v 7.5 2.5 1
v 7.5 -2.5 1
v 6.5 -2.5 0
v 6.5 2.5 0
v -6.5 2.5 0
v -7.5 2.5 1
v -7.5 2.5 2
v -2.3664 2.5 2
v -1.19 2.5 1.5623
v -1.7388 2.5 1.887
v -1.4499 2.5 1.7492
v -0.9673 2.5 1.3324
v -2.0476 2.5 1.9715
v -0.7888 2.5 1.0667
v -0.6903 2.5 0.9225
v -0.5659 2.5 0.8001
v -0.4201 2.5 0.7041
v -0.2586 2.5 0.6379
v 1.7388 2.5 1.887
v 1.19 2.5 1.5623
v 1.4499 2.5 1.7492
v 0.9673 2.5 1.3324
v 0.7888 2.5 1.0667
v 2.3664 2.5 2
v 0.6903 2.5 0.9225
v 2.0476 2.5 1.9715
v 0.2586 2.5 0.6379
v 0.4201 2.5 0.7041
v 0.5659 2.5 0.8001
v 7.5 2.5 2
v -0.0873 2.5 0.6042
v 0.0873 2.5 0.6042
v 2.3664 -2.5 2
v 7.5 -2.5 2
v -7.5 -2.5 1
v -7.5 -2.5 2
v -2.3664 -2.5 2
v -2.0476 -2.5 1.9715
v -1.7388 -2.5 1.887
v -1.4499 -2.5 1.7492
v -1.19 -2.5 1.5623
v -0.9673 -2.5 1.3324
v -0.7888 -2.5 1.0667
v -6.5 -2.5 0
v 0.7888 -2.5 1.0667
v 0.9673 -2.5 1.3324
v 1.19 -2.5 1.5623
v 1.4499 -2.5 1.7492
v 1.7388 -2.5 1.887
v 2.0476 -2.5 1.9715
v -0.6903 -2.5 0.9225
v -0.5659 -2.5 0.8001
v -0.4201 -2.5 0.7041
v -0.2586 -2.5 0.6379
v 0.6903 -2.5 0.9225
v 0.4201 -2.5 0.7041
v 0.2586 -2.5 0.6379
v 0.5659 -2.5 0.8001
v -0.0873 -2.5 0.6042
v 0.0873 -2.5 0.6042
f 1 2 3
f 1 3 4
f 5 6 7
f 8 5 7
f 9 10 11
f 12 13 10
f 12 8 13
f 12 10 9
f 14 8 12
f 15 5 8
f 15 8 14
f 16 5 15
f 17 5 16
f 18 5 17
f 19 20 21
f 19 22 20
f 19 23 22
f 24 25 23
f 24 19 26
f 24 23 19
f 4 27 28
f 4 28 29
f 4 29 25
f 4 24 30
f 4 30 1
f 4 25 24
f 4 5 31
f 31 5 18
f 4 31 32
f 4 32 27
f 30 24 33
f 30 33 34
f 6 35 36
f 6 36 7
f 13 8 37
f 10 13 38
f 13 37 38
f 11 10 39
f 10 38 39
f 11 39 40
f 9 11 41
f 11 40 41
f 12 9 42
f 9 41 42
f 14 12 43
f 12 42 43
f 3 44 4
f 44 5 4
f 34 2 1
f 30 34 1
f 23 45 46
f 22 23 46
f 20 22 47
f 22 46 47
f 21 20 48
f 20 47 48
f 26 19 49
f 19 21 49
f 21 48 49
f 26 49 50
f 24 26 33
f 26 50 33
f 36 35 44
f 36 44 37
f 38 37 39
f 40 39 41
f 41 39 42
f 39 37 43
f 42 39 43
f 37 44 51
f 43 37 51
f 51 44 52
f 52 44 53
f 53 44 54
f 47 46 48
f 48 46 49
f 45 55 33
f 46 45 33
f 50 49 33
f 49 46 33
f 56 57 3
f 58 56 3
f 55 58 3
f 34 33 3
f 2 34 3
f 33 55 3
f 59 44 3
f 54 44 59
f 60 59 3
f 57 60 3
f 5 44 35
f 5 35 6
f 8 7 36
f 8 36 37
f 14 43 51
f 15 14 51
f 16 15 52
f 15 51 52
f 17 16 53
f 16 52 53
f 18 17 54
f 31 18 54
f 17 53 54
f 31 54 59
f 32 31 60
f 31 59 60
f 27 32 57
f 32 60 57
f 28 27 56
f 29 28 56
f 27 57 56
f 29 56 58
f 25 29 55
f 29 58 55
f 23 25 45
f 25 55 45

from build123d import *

# Parameters (mm, degrees)
F0_W     = 15
F0_H     = 5
F1_DEPTH = 2
F2_W     = 4.732864
F2_H     = 0.538756
F3_DEPTH = 5.001
F4_SIZE  = 1


with BuildPart() as f1:
    # F0 (on Top) → F1 (new body)
    with BuildSketch(Plane.XY):
        Rectangle(F0_W, F0_H)
    extrude(amount=F1_DEPTH)

    # F2 (on face) → F3 (cut, through all)
    with BuildSketch(Plane.XZ.offset(2.5)):
        with BuildLine():
            ThreePointArc((-2.366432, 2), (-1.449917, 1.749193), (-0.788811, 1.066667))
            ThreePointArc((-0.788811, 1.066667), (0, 0.6), (0.788811, 1.066667))
            ThreePointArc((0.788811, 1.066667), (1.449917, 1.749193), (2.366432, 2))
            Line((2.366432, 2), (-2.366432, 2))
        make_face()
        with Locations((0, 2.269378)):
            Rectangle(F2_W, F2_H)
    extrude(amount=-F3_DEPTH, mode=Mode.SUBTRACT)

    # F4
    f4_edges = [f1.edges().sort_by_distance(p)[0] for p in [
        (-7.5, 0, 0),
        (7.5, 0, 0),
    ]]
    chamfer(f4_edges, length=F4_SIZE)


solid = f1.part
